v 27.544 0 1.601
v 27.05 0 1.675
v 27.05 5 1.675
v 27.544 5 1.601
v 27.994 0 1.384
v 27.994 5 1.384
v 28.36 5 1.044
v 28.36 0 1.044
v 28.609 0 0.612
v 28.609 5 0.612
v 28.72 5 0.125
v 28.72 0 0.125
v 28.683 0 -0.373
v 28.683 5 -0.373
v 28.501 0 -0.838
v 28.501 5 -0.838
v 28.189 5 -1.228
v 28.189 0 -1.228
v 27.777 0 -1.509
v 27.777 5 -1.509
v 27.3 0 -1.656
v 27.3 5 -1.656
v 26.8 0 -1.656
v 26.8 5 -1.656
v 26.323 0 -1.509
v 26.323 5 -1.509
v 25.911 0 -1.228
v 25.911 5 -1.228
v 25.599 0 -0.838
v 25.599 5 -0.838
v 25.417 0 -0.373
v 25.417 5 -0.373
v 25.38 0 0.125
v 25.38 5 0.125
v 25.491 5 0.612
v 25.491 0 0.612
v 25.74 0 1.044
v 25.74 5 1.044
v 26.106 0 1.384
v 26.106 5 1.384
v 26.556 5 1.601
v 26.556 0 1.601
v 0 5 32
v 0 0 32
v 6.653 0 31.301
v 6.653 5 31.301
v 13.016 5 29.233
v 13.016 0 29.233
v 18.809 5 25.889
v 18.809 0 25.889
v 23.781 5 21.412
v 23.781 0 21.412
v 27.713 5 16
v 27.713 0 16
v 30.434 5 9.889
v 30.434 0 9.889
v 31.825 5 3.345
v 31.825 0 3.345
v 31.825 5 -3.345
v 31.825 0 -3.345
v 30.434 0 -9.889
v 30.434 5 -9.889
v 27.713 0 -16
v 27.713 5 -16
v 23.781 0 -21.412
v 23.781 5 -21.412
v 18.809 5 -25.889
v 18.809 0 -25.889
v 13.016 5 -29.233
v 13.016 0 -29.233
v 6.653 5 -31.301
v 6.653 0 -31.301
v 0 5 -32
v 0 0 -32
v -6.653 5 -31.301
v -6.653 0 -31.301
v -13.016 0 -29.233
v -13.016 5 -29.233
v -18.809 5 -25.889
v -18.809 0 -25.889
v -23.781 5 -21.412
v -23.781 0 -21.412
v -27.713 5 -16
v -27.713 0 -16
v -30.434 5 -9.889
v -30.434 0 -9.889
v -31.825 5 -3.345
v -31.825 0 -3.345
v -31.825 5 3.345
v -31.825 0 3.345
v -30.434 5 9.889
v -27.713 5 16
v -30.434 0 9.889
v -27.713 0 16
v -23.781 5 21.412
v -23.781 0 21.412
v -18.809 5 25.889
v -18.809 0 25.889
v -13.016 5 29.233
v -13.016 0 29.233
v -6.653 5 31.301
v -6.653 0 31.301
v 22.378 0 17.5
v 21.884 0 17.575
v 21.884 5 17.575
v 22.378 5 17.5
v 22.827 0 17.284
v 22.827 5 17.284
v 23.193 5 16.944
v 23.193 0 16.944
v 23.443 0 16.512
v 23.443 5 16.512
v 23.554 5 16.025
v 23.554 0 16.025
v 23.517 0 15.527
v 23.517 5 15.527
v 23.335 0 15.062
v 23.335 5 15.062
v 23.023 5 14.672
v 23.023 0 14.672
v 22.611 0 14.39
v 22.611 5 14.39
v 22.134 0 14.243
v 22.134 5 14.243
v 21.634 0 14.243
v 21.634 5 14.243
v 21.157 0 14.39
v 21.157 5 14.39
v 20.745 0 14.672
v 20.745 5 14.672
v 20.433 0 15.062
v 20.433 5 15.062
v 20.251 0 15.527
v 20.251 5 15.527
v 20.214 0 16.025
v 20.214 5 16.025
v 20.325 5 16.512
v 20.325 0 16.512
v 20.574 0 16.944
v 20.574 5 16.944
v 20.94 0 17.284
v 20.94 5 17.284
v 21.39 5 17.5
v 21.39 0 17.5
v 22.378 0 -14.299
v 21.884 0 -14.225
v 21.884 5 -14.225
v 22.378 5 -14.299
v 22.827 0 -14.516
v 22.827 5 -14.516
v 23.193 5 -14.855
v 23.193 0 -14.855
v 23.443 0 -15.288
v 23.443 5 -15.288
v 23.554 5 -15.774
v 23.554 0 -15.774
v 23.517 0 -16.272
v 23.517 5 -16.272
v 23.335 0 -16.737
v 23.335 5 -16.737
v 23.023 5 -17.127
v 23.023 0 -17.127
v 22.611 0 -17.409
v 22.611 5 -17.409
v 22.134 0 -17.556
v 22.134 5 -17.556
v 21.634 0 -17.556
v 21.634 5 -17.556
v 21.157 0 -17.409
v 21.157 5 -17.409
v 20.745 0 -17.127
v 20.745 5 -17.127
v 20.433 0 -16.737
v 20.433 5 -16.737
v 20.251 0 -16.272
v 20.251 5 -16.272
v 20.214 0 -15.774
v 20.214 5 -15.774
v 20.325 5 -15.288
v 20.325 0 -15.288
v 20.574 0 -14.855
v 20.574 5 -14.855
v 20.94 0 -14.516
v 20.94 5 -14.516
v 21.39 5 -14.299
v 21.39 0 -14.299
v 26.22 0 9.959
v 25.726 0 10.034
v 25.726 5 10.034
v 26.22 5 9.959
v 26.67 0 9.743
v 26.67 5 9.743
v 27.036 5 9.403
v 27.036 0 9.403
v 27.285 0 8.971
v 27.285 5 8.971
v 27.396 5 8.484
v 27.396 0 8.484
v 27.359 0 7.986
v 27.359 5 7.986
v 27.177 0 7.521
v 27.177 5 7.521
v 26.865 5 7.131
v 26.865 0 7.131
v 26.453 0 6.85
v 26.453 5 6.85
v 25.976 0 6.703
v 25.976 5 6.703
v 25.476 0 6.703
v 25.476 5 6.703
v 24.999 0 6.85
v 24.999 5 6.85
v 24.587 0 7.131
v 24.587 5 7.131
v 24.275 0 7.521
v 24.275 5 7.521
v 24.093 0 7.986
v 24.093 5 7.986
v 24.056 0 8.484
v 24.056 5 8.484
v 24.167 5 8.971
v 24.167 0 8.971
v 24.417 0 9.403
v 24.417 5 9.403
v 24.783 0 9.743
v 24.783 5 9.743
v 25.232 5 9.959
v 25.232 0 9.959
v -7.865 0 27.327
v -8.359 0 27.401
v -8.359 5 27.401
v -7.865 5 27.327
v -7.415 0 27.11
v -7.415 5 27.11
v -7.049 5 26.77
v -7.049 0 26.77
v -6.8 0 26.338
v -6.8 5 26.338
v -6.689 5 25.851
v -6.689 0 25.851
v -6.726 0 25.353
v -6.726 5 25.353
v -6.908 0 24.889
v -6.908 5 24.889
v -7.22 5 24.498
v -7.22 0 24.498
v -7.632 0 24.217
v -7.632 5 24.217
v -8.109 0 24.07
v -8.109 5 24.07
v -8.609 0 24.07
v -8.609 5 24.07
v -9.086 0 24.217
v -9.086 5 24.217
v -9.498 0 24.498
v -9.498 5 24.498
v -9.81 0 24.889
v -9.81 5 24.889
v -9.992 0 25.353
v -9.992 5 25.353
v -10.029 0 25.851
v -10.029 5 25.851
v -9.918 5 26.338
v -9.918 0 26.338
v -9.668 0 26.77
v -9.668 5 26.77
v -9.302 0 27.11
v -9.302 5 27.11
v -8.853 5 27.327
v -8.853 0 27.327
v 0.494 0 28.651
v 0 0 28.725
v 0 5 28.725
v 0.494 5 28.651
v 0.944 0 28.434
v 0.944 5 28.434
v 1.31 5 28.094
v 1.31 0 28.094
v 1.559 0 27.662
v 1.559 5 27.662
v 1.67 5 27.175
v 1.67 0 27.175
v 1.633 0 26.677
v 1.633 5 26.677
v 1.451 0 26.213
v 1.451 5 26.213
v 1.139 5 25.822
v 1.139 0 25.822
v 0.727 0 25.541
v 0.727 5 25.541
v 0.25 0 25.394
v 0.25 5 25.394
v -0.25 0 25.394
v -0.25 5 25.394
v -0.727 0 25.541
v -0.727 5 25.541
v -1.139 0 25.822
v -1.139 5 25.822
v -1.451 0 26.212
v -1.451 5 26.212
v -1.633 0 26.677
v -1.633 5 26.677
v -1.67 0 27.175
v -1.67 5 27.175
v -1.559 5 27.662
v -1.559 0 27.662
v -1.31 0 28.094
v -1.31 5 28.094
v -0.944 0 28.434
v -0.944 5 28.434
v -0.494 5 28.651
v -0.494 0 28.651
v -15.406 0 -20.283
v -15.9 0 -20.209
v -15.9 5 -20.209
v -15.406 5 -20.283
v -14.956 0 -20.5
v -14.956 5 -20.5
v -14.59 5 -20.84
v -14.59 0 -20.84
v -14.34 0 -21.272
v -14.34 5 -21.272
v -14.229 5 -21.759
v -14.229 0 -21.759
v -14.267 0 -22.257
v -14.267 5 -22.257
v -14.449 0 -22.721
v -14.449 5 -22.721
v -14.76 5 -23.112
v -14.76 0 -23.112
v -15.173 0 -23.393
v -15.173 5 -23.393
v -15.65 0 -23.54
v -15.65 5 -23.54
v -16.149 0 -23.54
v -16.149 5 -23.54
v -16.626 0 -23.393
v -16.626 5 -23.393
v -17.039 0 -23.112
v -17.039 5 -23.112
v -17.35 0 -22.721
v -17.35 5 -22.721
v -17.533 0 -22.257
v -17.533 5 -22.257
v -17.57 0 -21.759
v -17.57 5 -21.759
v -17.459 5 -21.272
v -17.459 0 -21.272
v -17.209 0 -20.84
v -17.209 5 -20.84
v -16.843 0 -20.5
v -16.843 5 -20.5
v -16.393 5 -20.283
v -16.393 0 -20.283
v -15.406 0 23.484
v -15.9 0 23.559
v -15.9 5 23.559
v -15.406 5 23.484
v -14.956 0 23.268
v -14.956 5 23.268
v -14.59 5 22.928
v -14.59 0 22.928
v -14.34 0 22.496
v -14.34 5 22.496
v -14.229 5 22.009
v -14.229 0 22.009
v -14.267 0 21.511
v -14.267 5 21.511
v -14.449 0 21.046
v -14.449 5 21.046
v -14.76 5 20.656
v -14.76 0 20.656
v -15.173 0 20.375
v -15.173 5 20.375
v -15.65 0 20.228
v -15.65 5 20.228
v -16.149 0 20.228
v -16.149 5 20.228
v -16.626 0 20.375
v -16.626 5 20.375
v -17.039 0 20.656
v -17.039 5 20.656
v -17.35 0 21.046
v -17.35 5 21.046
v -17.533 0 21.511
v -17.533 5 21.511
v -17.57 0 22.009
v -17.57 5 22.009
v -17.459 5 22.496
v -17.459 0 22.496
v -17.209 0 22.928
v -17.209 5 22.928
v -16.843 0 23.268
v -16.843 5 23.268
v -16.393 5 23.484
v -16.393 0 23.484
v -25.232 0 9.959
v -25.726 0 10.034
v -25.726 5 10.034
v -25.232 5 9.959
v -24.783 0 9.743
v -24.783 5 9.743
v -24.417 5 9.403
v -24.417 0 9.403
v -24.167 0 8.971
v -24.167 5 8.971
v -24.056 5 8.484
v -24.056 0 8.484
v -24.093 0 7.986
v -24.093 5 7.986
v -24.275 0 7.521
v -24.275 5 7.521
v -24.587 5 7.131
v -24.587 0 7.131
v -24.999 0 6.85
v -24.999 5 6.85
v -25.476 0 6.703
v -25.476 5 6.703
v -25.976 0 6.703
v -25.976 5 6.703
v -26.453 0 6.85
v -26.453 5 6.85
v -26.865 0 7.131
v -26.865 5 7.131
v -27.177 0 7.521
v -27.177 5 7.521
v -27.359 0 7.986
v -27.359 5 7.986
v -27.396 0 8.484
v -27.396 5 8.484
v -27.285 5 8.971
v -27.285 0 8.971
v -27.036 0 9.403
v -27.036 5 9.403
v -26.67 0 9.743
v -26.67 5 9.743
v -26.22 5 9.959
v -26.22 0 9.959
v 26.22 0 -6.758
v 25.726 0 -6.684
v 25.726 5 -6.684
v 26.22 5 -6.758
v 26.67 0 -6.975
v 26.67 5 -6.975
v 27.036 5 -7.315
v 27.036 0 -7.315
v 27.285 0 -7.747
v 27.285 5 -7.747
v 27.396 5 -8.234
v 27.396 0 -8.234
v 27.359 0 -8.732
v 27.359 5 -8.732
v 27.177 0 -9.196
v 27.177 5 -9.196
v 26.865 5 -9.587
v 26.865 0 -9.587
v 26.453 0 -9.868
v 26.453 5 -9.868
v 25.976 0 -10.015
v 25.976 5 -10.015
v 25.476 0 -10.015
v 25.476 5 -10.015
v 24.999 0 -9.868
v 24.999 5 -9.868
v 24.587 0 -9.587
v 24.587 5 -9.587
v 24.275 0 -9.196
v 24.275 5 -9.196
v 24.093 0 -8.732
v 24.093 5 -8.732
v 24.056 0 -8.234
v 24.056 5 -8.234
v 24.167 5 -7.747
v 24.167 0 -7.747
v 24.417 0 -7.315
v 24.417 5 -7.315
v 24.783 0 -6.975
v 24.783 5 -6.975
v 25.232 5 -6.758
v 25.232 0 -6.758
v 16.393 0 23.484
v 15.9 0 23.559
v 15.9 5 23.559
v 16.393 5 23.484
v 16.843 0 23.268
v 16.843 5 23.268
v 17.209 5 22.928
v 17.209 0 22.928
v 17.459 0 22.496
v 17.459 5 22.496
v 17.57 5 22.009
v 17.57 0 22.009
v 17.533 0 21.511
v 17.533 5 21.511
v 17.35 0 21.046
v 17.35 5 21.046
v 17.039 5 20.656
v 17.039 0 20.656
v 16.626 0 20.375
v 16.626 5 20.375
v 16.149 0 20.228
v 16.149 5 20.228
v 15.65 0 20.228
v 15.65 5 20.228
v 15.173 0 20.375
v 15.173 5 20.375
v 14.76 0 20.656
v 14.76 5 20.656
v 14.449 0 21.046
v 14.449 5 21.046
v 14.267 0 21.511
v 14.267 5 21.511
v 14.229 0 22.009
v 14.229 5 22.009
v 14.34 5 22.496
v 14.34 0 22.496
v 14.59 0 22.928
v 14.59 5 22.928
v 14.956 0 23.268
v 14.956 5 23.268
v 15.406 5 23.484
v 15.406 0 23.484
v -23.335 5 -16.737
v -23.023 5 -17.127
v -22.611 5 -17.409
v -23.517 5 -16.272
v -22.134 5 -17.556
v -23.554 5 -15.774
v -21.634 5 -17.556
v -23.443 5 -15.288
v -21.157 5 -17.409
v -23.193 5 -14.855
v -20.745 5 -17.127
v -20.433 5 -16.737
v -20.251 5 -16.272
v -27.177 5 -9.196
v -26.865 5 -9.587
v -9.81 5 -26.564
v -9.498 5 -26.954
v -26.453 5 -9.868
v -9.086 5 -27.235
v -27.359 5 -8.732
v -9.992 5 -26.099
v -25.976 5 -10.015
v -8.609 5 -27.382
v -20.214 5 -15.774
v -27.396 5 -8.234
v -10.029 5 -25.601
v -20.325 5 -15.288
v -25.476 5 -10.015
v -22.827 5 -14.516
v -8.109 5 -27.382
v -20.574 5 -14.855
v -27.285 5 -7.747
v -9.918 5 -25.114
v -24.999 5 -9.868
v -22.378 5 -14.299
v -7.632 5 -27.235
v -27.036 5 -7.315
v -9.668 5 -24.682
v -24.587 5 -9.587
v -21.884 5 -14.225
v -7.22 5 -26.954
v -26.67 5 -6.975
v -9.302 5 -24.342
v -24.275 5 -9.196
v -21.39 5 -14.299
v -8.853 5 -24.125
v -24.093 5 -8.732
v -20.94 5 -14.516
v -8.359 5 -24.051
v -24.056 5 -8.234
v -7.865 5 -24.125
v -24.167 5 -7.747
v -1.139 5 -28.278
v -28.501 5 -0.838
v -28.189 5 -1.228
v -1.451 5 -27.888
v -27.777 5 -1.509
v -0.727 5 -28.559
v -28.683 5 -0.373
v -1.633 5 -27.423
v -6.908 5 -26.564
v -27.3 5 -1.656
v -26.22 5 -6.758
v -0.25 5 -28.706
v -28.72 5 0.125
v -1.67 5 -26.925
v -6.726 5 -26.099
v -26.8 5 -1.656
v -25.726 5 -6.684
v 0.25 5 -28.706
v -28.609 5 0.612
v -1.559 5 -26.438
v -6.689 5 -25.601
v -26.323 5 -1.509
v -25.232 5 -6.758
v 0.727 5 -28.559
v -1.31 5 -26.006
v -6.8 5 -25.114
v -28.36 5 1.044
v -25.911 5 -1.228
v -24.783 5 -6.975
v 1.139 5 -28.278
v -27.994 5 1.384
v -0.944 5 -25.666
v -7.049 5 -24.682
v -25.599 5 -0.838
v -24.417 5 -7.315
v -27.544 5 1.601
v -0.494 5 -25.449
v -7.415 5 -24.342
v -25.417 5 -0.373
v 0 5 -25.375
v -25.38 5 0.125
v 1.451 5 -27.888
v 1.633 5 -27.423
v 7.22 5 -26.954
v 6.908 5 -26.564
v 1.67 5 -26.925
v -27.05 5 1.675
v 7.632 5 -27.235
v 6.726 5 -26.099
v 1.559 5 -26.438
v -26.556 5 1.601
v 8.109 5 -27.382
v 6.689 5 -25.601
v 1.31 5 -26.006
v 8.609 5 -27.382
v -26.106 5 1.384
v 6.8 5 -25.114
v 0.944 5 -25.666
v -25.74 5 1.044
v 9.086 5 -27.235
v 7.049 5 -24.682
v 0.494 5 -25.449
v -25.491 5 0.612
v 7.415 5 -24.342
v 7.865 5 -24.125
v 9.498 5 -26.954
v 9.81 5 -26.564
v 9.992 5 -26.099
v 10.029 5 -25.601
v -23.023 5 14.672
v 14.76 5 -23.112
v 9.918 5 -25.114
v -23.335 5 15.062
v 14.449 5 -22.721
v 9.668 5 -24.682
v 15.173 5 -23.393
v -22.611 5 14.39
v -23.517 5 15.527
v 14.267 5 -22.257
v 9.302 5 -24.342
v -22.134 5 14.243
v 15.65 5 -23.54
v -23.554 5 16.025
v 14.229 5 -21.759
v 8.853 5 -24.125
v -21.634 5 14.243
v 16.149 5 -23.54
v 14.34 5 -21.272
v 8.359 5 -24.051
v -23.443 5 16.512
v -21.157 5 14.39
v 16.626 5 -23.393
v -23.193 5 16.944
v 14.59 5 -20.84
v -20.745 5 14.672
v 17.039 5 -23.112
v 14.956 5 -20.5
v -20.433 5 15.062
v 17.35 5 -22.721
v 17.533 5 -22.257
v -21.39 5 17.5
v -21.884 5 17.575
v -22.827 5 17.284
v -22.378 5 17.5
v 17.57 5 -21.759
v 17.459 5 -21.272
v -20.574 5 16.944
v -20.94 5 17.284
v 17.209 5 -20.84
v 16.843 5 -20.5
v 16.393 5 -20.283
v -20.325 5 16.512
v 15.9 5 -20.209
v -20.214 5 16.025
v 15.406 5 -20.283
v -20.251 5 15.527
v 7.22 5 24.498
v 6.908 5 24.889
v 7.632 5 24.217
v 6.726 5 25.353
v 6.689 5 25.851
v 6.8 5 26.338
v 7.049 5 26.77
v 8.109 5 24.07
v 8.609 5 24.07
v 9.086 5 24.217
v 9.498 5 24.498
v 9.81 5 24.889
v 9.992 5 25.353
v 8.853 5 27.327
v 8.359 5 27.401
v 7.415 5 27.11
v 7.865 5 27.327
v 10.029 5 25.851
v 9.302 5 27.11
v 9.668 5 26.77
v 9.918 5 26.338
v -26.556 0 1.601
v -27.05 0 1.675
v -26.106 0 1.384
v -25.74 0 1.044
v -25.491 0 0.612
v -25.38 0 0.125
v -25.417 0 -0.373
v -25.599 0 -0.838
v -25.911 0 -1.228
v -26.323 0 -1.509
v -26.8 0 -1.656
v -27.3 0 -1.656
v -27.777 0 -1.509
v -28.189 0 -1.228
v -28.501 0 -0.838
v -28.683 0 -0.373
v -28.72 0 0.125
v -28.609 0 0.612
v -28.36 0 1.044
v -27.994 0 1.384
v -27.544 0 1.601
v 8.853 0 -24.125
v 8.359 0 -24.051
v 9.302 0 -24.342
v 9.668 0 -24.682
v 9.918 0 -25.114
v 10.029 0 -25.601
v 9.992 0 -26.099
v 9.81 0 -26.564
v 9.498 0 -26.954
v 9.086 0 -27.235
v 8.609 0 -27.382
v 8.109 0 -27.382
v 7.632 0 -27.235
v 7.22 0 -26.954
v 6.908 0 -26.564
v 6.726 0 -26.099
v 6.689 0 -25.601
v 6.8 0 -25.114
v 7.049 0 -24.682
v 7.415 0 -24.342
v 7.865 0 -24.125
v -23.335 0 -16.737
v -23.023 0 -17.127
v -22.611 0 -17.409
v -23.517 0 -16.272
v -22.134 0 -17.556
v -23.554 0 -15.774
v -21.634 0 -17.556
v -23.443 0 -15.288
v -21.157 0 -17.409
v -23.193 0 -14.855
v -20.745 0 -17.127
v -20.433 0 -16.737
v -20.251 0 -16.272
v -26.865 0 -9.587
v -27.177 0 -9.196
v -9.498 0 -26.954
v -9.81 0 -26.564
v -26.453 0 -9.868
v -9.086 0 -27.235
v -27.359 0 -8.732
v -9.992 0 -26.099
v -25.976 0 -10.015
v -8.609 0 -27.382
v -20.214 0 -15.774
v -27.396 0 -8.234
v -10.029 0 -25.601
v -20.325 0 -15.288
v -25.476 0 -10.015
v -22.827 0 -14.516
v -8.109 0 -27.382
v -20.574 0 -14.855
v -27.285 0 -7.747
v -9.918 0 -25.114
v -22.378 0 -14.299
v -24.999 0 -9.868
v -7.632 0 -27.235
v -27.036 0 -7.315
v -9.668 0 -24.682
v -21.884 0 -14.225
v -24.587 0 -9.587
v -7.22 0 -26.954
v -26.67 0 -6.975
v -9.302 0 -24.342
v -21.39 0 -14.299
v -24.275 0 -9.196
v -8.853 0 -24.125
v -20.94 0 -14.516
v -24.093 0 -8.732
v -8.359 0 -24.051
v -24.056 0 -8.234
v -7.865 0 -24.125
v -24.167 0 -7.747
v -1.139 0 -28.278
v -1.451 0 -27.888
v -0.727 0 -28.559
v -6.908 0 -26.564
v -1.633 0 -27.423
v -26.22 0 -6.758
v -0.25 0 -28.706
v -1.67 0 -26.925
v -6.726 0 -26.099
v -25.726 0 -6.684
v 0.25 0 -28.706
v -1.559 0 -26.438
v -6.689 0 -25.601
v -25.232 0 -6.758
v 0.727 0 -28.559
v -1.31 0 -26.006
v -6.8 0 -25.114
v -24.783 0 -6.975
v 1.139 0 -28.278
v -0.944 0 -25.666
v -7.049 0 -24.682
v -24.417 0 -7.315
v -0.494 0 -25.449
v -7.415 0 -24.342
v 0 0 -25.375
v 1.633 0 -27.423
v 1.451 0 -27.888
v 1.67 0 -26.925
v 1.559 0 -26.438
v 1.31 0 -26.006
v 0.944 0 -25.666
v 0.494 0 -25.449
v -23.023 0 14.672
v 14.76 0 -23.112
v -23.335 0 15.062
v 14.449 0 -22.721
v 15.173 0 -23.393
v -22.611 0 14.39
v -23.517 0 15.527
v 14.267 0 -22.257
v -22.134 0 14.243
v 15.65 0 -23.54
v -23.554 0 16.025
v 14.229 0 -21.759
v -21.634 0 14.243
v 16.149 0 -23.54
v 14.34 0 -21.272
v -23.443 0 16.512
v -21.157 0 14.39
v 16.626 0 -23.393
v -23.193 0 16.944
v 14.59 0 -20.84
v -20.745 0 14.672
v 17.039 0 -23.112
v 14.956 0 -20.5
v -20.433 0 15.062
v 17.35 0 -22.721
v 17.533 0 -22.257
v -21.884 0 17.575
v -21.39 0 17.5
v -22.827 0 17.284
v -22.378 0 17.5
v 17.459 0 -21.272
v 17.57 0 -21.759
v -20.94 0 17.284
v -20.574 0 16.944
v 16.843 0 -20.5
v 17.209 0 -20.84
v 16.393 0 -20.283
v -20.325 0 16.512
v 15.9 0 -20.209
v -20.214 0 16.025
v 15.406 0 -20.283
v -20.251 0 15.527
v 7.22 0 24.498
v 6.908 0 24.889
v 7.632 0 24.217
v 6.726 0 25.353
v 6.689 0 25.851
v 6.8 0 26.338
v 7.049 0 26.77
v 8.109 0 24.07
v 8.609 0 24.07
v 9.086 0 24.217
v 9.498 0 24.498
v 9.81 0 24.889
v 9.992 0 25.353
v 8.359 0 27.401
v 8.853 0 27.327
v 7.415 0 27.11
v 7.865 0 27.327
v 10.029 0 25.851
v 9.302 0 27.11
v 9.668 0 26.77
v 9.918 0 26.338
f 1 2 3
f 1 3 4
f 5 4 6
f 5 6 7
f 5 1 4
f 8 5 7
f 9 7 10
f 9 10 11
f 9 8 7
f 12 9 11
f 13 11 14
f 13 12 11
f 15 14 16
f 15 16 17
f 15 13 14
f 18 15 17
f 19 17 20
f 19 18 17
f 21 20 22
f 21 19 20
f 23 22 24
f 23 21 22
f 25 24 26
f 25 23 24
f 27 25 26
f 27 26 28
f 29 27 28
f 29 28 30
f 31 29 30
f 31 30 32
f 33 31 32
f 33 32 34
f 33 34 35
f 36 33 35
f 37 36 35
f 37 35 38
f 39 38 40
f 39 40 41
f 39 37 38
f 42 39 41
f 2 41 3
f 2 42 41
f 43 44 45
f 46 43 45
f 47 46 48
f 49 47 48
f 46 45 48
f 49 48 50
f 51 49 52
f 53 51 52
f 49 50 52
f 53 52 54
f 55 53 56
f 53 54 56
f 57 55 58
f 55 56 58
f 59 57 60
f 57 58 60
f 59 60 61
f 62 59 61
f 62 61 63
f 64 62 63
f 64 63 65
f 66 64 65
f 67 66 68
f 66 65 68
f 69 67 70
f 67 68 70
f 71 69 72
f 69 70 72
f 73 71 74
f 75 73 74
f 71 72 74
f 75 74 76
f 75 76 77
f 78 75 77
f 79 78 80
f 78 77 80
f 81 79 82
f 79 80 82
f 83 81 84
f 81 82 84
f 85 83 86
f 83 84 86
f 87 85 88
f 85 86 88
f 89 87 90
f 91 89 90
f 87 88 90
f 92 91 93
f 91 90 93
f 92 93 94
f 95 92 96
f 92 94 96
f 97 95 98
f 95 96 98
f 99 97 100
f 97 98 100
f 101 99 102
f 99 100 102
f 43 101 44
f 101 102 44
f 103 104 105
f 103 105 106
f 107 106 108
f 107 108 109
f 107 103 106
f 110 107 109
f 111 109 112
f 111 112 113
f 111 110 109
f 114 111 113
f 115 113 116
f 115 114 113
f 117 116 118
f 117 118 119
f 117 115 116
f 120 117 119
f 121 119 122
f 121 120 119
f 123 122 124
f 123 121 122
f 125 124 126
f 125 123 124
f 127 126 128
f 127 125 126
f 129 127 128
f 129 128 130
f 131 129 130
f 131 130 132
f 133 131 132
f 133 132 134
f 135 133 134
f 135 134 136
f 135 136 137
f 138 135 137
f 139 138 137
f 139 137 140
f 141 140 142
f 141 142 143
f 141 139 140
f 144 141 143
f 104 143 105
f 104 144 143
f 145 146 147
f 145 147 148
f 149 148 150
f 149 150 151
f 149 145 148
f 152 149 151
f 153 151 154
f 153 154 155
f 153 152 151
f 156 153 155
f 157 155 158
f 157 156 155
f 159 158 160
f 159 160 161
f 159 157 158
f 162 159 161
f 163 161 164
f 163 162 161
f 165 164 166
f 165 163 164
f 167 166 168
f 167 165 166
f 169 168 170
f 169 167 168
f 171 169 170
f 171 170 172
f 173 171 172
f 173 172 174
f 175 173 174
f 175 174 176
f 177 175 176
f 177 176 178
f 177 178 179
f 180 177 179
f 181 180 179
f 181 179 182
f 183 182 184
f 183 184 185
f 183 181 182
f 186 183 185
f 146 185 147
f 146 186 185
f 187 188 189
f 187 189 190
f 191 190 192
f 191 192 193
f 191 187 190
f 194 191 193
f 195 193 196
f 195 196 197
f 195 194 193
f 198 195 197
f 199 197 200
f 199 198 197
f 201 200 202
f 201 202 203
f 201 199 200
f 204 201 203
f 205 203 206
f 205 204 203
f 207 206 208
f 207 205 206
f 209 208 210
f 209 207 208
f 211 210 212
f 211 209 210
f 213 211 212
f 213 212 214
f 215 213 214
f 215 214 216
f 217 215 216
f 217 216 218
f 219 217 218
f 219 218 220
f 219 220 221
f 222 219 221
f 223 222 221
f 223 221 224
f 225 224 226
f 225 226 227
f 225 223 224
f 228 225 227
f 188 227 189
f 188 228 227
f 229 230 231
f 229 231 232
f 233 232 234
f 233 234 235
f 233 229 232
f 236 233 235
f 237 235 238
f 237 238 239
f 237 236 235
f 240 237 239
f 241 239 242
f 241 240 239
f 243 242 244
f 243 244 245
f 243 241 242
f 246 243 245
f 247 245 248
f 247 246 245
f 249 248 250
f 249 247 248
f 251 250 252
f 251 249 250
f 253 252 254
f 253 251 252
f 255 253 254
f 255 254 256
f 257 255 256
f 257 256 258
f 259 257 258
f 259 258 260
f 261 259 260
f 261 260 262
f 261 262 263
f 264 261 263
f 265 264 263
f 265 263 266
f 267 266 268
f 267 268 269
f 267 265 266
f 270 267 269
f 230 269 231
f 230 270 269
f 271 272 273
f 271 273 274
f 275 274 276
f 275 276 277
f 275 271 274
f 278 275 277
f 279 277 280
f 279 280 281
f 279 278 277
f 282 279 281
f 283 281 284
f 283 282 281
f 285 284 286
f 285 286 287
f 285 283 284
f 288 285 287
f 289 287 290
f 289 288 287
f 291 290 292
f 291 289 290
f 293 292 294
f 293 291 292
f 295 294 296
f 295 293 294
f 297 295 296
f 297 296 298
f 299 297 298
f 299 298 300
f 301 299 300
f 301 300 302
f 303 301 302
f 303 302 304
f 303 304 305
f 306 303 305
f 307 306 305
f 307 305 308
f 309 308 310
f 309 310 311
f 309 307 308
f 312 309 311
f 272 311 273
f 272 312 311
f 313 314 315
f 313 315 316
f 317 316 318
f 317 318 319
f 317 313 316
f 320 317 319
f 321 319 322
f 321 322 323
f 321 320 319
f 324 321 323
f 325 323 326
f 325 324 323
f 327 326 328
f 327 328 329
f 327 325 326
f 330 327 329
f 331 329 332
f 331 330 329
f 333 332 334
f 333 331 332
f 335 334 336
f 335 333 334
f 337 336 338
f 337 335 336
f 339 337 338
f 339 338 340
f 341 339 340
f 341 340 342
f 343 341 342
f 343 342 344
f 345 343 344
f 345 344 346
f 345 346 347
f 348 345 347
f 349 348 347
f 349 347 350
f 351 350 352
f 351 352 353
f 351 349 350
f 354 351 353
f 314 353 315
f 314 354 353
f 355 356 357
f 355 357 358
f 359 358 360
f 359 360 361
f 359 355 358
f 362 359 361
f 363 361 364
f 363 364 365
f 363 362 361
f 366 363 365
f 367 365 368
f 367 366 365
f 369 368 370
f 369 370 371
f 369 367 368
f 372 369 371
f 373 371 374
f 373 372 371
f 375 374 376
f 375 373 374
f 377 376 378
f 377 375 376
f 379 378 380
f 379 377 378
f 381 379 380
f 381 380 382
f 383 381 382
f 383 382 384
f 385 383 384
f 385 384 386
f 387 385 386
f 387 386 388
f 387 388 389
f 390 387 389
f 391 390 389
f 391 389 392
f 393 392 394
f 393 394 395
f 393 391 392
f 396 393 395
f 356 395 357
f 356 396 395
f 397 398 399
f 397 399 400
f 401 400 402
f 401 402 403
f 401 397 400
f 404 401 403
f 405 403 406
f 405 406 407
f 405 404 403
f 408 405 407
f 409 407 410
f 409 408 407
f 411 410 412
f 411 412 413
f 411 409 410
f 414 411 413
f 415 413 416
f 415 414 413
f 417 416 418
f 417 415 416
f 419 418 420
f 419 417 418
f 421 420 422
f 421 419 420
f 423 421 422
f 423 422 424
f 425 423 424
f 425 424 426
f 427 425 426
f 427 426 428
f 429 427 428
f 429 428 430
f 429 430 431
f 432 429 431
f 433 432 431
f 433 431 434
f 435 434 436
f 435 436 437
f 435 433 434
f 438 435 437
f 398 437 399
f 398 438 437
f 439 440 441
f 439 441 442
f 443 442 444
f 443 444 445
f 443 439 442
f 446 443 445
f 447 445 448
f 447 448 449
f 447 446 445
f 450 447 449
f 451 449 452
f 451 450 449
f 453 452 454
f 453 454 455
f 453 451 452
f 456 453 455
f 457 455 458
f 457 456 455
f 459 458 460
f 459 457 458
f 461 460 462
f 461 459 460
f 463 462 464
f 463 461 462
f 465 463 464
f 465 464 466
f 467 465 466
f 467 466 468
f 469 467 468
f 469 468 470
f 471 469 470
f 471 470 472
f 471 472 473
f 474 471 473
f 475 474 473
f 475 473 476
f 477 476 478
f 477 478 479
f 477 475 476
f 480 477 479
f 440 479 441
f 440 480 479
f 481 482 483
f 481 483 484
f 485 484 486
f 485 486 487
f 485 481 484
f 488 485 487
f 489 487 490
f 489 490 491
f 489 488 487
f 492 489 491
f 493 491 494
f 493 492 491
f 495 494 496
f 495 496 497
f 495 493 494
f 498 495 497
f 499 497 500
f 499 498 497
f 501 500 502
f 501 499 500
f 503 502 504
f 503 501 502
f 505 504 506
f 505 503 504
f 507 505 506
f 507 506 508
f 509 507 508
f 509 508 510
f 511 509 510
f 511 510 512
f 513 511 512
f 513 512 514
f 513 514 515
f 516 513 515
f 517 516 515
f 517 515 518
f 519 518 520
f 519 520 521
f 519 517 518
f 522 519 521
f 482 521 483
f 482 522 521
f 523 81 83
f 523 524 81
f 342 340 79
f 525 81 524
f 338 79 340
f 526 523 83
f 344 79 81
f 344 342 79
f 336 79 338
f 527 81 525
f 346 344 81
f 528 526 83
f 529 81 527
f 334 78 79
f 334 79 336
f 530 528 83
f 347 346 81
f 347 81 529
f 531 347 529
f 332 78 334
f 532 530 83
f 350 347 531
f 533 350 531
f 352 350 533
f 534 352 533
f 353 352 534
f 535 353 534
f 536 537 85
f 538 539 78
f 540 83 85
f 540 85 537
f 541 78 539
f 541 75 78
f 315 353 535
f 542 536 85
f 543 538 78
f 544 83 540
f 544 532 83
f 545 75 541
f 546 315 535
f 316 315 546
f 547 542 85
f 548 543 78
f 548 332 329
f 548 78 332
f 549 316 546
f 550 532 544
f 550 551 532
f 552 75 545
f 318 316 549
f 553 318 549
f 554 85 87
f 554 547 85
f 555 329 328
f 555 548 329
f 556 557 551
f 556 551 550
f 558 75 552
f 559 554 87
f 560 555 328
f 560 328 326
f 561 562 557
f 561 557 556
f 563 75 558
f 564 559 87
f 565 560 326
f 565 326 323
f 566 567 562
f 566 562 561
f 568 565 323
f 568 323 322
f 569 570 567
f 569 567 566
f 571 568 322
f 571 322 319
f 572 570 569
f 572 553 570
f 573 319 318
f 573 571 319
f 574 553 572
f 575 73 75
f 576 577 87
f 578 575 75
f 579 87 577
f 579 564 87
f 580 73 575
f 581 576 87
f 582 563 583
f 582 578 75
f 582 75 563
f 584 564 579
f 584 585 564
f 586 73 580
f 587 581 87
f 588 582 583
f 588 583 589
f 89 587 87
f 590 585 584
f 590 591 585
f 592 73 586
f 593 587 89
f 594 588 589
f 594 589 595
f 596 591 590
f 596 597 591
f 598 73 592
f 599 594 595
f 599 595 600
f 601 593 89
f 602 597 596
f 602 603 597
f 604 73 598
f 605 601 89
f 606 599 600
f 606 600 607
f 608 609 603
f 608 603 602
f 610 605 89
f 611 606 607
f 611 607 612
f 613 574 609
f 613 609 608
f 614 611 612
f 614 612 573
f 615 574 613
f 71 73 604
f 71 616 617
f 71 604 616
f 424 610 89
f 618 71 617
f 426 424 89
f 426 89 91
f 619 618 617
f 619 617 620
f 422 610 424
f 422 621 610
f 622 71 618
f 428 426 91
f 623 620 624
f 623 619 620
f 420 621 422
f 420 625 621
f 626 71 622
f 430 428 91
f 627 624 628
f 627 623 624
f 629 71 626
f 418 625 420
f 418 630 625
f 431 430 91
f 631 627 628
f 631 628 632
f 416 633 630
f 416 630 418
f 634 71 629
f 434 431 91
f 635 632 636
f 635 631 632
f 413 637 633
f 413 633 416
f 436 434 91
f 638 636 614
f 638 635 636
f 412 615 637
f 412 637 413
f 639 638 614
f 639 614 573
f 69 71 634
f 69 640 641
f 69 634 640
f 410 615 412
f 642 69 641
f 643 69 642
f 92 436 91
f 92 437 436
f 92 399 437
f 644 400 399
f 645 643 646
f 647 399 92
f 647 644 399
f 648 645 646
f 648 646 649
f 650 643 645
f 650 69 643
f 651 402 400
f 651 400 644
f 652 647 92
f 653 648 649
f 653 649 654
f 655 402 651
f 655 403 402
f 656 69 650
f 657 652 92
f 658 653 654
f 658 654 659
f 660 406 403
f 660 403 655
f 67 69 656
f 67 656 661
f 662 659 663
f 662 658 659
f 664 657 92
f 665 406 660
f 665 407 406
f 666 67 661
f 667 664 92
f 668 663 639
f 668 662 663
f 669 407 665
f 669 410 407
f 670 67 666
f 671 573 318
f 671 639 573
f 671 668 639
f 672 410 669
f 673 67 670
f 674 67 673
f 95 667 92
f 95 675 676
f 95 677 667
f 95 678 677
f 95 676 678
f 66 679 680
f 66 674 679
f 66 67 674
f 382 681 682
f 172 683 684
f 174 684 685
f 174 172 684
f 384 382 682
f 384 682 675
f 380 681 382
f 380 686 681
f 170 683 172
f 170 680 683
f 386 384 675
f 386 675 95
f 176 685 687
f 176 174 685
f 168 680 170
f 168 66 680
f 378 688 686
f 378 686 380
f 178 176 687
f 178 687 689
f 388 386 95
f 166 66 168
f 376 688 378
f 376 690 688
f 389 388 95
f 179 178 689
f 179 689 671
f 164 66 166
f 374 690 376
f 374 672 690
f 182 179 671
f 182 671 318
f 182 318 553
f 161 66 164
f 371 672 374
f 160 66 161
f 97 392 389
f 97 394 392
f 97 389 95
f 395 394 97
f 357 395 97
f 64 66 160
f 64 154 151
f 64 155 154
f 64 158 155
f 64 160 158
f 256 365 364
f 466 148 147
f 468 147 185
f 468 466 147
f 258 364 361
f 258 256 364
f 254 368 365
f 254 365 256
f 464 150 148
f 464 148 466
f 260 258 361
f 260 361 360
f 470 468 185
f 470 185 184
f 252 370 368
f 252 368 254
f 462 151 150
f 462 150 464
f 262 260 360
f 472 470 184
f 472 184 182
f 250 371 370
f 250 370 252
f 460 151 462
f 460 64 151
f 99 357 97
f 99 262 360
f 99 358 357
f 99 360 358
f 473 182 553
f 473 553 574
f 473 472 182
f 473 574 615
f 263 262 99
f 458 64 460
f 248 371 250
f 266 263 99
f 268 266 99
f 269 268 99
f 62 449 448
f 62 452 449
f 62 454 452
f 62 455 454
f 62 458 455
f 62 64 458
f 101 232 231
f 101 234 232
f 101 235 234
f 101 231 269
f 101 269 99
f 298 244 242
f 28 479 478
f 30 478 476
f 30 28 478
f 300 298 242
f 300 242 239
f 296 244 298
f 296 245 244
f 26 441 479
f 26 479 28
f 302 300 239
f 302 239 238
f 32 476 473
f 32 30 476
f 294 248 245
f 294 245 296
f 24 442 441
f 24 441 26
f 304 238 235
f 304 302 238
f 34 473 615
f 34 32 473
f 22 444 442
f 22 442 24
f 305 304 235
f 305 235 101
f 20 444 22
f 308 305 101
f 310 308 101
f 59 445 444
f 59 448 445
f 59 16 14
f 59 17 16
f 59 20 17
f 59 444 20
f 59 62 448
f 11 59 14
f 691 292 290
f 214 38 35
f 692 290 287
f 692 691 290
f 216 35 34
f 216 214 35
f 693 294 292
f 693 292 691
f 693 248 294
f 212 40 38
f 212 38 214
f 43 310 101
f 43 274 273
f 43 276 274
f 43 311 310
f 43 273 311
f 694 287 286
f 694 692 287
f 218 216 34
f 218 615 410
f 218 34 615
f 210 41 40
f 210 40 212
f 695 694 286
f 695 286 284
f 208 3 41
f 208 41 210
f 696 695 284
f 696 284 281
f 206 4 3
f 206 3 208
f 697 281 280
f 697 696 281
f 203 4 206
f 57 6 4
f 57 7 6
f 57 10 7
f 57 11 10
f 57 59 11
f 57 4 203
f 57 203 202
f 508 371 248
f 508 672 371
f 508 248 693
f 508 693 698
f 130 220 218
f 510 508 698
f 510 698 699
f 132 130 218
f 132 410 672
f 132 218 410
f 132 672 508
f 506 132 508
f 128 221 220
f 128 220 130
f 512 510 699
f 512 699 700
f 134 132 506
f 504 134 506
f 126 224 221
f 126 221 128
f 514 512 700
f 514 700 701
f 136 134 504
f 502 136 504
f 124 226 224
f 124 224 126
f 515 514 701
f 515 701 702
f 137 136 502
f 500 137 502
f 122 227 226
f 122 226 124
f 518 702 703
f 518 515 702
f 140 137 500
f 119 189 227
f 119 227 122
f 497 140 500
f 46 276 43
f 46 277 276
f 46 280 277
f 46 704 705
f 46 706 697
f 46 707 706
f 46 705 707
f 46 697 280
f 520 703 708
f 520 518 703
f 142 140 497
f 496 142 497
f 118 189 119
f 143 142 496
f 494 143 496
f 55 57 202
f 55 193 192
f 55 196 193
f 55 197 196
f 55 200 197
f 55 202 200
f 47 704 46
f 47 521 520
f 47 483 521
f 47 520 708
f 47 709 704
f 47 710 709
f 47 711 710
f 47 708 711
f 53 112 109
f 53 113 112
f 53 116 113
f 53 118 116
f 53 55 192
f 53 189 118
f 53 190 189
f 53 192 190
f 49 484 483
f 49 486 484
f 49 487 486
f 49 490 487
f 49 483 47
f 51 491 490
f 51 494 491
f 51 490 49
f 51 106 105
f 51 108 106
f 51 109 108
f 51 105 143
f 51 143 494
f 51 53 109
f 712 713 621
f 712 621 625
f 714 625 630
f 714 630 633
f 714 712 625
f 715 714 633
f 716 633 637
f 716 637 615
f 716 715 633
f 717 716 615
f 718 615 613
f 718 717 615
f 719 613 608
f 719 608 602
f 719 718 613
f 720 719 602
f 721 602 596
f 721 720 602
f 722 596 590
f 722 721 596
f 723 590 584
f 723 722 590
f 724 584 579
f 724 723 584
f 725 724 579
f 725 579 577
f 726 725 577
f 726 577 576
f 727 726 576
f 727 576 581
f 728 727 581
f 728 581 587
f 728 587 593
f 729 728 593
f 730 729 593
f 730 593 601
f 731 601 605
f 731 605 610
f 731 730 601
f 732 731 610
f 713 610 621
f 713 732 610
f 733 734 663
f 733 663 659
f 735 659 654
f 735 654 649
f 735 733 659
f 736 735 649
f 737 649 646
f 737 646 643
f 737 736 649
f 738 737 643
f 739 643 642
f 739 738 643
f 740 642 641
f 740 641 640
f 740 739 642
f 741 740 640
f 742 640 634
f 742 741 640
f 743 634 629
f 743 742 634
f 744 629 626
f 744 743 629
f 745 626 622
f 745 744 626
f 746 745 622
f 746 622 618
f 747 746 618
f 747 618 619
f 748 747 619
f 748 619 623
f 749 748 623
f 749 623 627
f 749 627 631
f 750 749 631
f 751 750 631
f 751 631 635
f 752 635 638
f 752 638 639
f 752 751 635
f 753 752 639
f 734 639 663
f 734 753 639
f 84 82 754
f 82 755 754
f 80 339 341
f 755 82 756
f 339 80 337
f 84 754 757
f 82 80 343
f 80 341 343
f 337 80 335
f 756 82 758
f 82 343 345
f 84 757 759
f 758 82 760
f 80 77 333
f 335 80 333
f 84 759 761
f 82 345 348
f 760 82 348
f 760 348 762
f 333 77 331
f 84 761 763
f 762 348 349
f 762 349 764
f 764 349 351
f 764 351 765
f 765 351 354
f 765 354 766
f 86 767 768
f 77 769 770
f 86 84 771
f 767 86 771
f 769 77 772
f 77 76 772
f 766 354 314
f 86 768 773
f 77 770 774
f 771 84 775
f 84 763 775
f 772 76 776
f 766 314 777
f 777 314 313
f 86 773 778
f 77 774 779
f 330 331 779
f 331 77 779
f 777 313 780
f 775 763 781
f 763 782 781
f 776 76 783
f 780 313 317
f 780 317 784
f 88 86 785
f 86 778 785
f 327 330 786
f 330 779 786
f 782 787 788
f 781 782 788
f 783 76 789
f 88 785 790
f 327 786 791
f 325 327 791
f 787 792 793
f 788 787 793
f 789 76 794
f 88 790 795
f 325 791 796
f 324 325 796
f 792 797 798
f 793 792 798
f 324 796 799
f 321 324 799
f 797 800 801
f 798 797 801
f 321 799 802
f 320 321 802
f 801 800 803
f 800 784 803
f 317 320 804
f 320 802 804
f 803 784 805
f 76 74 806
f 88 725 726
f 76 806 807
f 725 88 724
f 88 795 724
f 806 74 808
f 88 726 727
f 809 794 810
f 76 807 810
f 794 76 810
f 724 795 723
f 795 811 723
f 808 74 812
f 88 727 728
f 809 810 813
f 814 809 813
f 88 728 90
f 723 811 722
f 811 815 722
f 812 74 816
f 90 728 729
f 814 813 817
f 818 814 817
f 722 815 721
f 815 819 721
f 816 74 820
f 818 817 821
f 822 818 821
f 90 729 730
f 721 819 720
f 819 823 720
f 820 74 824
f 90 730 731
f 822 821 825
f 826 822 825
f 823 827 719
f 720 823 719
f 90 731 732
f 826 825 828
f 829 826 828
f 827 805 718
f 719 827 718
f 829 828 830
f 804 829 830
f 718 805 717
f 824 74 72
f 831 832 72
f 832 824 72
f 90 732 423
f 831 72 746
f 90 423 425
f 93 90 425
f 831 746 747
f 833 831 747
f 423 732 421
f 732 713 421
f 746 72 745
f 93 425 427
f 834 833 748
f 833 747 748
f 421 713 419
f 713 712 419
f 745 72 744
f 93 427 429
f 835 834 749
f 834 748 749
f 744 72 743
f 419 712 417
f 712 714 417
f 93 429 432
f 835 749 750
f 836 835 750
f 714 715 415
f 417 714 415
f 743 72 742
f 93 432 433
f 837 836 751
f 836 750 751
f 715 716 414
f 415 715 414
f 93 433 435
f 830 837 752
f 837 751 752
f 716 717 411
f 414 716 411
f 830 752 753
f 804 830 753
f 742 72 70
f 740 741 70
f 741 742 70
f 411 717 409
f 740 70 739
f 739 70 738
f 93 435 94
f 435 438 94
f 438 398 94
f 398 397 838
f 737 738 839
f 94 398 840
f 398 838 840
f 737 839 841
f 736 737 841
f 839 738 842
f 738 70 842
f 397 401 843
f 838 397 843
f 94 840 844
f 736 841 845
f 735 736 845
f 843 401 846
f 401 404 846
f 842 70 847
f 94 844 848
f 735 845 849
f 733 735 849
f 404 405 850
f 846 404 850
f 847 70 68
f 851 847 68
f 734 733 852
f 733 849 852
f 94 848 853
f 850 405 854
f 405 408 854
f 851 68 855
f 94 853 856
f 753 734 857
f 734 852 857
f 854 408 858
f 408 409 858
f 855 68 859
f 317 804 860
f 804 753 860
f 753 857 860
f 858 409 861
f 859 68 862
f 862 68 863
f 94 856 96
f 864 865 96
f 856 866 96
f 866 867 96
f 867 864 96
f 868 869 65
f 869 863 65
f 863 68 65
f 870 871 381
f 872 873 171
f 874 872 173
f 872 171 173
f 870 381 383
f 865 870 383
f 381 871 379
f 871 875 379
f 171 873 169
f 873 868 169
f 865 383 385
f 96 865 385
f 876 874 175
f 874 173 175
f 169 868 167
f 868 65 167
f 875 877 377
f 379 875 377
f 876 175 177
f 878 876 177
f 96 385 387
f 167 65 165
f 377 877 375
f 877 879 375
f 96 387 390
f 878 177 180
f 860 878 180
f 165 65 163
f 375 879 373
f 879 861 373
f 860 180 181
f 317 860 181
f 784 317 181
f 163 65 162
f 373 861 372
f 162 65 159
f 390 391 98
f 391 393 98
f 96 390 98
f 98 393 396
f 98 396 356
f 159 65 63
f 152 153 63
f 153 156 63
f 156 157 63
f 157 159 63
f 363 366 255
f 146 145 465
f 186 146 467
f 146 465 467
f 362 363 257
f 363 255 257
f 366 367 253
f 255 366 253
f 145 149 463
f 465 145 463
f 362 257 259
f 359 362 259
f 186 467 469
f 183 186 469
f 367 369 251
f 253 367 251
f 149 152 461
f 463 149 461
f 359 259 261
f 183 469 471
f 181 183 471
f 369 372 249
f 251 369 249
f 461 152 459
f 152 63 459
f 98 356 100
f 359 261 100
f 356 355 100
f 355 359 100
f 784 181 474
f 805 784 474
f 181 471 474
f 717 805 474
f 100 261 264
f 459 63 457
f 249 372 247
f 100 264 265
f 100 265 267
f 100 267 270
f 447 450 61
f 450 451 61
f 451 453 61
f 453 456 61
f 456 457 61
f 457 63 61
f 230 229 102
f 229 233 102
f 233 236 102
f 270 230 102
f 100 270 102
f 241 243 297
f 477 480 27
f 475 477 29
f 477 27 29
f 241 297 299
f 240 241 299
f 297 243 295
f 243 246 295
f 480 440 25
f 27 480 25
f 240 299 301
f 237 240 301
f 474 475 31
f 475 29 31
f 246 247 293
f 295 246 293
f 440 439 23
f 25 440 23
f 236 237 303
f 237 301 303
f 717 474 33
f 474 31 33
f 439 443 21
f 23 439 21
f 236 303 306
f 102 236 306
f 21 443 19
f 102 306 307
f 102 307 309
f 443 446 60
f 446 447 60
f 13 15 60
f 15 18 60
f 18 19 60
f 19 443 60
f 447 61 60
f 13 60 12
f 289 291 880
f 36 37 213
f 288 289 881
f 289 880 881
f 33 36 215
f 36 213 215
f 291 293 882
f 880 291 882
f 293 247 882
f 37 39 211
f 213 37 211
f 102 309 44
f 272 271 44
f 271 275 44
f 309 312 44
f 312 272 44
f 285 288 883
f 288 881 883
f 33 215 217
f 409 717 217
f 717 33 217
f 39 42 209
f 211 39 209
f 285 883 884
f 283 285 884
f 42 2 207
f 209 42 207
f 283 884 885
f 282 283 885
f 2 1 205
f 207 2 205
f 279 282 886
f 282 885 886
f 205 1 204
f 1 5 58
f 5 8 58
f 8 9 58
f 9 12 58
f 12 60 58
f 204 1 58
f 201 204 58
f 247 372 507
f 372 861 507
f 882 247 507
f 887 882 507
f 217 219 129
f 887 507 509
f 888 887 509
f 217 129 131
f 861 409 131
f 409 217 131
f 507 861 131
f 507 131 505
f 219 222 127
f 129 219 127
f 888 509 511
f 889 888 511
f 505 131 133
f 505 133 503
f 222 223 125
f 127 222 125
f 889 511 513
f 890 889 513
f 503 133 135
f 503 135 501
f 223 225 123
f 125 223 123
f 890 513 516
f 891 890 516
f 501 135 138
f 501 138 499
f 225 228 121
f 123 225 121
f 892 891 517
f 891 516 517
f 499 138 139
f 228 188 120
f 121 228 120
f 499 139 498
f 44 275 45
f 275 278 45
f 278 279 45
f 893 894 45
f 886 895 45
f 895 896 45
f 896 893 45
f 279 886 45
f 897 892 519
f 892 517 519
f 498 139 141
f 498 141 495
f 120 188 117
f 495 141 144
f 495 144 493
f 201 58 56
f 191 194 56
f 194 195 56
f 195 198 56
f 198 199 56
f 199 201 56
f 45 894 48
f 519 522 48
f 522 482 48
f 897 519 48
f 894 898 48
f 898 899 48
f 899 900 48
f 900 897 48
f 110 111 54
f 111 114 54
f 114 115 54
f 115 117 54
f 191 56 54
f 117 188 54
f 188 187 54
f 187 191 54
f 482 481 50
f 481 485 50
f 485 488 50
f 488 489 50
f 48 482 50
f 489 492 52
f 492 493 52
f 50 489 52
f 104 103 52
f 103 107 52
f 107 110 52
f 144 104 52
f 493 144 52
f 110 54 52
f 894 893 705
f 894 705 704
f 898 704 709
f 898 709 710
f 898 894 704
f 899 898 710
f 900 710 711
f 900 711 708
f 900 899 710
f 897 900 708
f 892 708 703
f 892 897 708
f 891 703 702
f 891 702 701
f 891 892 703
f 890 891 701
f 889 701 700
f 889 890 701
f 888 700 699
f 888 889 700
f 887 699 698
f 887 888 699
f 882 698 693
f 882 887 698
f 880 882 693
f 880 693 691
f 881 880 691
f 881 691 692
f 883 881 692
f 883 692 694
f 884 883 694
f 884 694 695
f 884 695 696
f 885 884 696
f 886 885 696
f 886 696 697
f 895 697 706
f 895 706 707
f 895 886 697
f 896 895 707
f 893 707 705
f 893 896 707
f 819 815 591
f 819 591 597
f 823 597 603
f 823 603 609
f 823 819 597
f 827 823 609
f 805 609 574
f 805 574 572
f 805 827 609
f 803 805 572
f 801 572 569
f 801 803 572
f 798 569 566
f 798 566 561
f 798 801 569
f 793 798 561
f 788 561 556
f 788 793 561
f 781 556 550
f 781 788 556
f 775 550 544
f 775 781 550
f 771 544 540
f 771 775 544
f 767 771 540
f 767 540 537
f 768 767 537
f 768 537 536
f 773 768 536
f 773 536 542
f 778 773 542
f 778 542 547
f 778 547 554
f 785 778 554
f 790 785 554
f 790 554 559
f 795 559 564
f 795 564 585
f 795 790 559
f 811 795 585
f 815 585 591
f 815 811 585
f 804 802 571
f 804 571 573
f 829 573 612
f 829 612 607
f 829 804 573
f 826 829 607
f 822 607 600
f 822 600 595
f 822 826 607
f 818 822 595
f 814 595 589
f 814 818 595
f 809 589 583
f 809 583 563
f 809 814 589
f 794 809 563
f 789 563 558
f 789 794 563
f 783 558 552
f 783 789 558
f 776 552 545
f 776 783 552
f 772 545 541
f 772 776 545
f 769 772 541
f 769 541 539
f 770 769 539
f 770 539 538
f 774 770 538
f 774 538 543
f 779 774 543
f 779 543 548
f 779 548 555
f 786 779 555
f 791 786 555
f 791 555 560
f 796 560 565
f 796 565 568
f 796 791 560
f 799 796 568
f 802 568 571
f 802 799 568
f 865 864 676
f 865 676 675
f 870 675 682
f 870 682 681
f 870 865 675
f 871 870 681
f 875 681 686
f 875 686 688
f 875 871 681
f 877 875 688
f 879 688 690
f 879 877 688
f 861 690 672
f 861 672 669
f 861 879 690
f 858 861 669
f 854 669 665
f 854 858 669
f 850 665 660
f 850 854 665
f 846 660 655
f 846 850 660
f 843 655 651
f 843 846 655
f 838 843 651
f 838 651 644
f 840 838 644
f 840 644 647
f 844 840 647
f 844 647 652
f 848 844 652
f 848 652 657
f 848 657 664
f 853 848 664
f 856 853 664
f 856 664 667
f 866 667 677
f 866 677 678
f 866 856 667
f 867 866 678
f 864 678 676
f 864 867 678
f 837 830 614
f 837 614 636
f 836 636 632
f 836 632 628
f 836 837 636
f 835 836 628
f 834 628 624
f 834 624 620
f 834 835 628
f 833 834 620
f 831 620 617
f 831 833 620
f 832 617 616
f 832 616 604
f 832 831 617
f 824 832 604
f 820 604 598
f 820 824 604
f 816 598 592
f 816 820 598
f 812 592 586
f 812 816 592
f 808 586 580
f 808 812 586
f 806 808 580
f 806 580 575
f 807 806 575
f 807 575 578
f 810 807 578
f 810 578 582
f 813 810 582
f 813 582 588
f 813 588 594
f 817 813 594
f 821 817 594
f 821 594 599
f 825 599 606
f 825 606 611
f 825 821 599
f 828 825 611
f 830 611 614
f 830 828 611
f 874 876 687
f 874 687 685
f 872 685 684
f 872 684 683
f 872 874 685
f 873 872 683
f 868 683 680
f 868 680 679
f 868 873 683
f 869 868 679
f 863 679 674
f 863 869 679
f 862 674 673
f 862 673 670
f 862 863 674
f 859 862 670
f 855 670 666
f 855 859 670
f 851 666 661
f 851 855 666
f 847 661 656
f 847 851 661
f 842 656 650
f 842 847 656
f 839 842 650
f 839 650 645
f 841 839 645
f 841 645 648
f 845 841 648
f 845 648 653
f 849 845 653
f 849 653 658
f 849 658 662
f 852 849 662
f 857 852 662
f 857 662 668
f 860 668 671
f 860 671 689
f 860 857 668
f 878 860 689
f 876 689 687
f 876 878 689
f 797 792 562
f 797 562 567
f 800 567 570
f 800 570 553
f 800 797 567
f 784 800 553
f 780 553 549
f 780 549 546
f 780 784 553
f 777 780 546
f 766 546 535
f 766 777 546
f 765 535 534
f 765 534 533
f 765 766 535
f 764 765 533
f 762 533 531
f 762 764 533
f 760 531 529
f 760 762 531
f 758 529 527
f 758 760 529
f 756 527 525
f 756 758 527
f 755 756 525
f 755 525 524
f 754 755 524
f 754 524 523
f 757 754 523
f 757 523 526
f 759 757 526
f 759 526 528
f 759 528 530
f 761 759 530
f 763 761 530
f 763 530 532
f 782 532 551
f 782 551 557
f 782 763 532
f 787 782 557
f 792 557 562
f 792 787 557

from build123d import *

# Parameters (mm, degrees)
SKETCH1_R           = 32
SKETCH1_R_2         = 1.675
BOSS_EXTRUDE1_DEPTH = 5


with BuildPart() as part:
    # Sketch1 → Boss-Extrude1 (new body)
    with BuildSketch(Plane(origin=(0, 0, 0), x_dir=(1, 0, 0), z_dir=(0, 1, 0))):
        with Locations(Location((0, 0, 0), (0, 0, 270))):
            Circle(SKETCH1_R)
        with Locations(Location((0, -27.05, 0), (0, 0, 270))):
            Circle(SKETCH1_R_2, mode=Mode.SUBTRACT)
        with Locations(Location((-8.358909698, -25.726078766, 0), (0, 0, 270))):
            Circle(SKETCH1_R_2, mode=Mode.SUBTRACT)
        with Locations(Location((-15.899591075, -21.883909698, 0), (0, 0, 270))):
            Circle(SKETCH1_R_2, mode=Mode.SUBTRACT)
        with Locations(Location((-21.883909698, -15.899591075, 0), (0, 0, 270))):
            Circle(SKETCH1_R_2, mode=Mode.SUBTRACT)
        with Locations(Location((-25.726078766, -8.358909698, 0), (0, 0, 270))):
            Circle(SKETCH1_R_2, mode=Mode.SUBTRACT)
        with Locations(Location((-27.05, 0, 0), (0, 0, 270))):
            Circle(SKETCH1_R_2, mode=Mode.SUBTRACT)
        with Locations(Location((-25.726078766, 8.358909698, 0), (0, 0, 270))):
            Circle(SKETCH1_R_2, mode=Mode.SUBTRACT)
        with Locations(Location((-21.883909698, 15.899591075, 0), (0, 0, 270))):
            Circle(SKETCH1_R_2, mode=Mode.SUBTRACT)
        with Locations(Location((-15.899591075, 21.883909698, 0), (0, 0, 270))):
            Circle(SKETCH1_R_2, mode=Mode.SUBTRACT)
        with Locations(Location((-8.358909698, 25.726078766, 0), (0, 0, 270))):
            Circle(SKETCH1_R_2, mode=Mode.SUBTRACT)
        with Locations(Location((0, 27.05, 0), (0, 0, 270))):
            Circle(SKETCH1_R_2, mode=Mode.SUBTRACT)
        with Locations(Location((8.358909698, 25.726078766, 0), (0, 0, 270))):
            Circle(SKETCH1_R_2, mode=Mode.SUBTRACT)
        with Locations(Location((15.899591075, 21.883909698, 0), (0, 0, 270))):
            Circle(SKETCH1_R_2, mode=Mode.SUBTRACT)
        with Locations(Location((21.883909698, 15.899591075, 0), (0, 0, 270))):
            Circle(SKETCH1_R_2, mode=Mode.SUBTRACT)
        with Locations(Location((25.726078766, 8.358909698, 0), (0, 0, 270))):
            Circle(SKETCH1_R_2, mode=Mode.SUBTRACT)
        with Locations(Location((27.05, 0, 0), (0, 0, 270))):
            Circle(SKETCH1_R_2, mode=Mode.SUBTRACT)
        with Locations(Location((25.726078766, -8.358909698, 0), (0, 0, 270))):
            Circle(SKETCH1_R_2, mode=Mode.SUBTRACT)
        with Locations(Location((21.883909698, -15.899591075, 0), (0, 0, 270))):
            Circle(SKETCH1_R_2, mode=Mode.SUBTRACT)
        with Locations(Location((15.899591075, -21.883909698, 0), (0, 0, 270))):
            Circle(SKETCH1_R_2, mode=Mode.SUBTRACT)
        with Locations(Location((8.358909698, -25.726078766, 0), (0, 0, 270))):
            Circle(SKETCH1_R_2, mode=Mode.SUBTRACT)
    extrude(amount=BOSS_EXTRUDE1_DEPTH)


solid = part.part
